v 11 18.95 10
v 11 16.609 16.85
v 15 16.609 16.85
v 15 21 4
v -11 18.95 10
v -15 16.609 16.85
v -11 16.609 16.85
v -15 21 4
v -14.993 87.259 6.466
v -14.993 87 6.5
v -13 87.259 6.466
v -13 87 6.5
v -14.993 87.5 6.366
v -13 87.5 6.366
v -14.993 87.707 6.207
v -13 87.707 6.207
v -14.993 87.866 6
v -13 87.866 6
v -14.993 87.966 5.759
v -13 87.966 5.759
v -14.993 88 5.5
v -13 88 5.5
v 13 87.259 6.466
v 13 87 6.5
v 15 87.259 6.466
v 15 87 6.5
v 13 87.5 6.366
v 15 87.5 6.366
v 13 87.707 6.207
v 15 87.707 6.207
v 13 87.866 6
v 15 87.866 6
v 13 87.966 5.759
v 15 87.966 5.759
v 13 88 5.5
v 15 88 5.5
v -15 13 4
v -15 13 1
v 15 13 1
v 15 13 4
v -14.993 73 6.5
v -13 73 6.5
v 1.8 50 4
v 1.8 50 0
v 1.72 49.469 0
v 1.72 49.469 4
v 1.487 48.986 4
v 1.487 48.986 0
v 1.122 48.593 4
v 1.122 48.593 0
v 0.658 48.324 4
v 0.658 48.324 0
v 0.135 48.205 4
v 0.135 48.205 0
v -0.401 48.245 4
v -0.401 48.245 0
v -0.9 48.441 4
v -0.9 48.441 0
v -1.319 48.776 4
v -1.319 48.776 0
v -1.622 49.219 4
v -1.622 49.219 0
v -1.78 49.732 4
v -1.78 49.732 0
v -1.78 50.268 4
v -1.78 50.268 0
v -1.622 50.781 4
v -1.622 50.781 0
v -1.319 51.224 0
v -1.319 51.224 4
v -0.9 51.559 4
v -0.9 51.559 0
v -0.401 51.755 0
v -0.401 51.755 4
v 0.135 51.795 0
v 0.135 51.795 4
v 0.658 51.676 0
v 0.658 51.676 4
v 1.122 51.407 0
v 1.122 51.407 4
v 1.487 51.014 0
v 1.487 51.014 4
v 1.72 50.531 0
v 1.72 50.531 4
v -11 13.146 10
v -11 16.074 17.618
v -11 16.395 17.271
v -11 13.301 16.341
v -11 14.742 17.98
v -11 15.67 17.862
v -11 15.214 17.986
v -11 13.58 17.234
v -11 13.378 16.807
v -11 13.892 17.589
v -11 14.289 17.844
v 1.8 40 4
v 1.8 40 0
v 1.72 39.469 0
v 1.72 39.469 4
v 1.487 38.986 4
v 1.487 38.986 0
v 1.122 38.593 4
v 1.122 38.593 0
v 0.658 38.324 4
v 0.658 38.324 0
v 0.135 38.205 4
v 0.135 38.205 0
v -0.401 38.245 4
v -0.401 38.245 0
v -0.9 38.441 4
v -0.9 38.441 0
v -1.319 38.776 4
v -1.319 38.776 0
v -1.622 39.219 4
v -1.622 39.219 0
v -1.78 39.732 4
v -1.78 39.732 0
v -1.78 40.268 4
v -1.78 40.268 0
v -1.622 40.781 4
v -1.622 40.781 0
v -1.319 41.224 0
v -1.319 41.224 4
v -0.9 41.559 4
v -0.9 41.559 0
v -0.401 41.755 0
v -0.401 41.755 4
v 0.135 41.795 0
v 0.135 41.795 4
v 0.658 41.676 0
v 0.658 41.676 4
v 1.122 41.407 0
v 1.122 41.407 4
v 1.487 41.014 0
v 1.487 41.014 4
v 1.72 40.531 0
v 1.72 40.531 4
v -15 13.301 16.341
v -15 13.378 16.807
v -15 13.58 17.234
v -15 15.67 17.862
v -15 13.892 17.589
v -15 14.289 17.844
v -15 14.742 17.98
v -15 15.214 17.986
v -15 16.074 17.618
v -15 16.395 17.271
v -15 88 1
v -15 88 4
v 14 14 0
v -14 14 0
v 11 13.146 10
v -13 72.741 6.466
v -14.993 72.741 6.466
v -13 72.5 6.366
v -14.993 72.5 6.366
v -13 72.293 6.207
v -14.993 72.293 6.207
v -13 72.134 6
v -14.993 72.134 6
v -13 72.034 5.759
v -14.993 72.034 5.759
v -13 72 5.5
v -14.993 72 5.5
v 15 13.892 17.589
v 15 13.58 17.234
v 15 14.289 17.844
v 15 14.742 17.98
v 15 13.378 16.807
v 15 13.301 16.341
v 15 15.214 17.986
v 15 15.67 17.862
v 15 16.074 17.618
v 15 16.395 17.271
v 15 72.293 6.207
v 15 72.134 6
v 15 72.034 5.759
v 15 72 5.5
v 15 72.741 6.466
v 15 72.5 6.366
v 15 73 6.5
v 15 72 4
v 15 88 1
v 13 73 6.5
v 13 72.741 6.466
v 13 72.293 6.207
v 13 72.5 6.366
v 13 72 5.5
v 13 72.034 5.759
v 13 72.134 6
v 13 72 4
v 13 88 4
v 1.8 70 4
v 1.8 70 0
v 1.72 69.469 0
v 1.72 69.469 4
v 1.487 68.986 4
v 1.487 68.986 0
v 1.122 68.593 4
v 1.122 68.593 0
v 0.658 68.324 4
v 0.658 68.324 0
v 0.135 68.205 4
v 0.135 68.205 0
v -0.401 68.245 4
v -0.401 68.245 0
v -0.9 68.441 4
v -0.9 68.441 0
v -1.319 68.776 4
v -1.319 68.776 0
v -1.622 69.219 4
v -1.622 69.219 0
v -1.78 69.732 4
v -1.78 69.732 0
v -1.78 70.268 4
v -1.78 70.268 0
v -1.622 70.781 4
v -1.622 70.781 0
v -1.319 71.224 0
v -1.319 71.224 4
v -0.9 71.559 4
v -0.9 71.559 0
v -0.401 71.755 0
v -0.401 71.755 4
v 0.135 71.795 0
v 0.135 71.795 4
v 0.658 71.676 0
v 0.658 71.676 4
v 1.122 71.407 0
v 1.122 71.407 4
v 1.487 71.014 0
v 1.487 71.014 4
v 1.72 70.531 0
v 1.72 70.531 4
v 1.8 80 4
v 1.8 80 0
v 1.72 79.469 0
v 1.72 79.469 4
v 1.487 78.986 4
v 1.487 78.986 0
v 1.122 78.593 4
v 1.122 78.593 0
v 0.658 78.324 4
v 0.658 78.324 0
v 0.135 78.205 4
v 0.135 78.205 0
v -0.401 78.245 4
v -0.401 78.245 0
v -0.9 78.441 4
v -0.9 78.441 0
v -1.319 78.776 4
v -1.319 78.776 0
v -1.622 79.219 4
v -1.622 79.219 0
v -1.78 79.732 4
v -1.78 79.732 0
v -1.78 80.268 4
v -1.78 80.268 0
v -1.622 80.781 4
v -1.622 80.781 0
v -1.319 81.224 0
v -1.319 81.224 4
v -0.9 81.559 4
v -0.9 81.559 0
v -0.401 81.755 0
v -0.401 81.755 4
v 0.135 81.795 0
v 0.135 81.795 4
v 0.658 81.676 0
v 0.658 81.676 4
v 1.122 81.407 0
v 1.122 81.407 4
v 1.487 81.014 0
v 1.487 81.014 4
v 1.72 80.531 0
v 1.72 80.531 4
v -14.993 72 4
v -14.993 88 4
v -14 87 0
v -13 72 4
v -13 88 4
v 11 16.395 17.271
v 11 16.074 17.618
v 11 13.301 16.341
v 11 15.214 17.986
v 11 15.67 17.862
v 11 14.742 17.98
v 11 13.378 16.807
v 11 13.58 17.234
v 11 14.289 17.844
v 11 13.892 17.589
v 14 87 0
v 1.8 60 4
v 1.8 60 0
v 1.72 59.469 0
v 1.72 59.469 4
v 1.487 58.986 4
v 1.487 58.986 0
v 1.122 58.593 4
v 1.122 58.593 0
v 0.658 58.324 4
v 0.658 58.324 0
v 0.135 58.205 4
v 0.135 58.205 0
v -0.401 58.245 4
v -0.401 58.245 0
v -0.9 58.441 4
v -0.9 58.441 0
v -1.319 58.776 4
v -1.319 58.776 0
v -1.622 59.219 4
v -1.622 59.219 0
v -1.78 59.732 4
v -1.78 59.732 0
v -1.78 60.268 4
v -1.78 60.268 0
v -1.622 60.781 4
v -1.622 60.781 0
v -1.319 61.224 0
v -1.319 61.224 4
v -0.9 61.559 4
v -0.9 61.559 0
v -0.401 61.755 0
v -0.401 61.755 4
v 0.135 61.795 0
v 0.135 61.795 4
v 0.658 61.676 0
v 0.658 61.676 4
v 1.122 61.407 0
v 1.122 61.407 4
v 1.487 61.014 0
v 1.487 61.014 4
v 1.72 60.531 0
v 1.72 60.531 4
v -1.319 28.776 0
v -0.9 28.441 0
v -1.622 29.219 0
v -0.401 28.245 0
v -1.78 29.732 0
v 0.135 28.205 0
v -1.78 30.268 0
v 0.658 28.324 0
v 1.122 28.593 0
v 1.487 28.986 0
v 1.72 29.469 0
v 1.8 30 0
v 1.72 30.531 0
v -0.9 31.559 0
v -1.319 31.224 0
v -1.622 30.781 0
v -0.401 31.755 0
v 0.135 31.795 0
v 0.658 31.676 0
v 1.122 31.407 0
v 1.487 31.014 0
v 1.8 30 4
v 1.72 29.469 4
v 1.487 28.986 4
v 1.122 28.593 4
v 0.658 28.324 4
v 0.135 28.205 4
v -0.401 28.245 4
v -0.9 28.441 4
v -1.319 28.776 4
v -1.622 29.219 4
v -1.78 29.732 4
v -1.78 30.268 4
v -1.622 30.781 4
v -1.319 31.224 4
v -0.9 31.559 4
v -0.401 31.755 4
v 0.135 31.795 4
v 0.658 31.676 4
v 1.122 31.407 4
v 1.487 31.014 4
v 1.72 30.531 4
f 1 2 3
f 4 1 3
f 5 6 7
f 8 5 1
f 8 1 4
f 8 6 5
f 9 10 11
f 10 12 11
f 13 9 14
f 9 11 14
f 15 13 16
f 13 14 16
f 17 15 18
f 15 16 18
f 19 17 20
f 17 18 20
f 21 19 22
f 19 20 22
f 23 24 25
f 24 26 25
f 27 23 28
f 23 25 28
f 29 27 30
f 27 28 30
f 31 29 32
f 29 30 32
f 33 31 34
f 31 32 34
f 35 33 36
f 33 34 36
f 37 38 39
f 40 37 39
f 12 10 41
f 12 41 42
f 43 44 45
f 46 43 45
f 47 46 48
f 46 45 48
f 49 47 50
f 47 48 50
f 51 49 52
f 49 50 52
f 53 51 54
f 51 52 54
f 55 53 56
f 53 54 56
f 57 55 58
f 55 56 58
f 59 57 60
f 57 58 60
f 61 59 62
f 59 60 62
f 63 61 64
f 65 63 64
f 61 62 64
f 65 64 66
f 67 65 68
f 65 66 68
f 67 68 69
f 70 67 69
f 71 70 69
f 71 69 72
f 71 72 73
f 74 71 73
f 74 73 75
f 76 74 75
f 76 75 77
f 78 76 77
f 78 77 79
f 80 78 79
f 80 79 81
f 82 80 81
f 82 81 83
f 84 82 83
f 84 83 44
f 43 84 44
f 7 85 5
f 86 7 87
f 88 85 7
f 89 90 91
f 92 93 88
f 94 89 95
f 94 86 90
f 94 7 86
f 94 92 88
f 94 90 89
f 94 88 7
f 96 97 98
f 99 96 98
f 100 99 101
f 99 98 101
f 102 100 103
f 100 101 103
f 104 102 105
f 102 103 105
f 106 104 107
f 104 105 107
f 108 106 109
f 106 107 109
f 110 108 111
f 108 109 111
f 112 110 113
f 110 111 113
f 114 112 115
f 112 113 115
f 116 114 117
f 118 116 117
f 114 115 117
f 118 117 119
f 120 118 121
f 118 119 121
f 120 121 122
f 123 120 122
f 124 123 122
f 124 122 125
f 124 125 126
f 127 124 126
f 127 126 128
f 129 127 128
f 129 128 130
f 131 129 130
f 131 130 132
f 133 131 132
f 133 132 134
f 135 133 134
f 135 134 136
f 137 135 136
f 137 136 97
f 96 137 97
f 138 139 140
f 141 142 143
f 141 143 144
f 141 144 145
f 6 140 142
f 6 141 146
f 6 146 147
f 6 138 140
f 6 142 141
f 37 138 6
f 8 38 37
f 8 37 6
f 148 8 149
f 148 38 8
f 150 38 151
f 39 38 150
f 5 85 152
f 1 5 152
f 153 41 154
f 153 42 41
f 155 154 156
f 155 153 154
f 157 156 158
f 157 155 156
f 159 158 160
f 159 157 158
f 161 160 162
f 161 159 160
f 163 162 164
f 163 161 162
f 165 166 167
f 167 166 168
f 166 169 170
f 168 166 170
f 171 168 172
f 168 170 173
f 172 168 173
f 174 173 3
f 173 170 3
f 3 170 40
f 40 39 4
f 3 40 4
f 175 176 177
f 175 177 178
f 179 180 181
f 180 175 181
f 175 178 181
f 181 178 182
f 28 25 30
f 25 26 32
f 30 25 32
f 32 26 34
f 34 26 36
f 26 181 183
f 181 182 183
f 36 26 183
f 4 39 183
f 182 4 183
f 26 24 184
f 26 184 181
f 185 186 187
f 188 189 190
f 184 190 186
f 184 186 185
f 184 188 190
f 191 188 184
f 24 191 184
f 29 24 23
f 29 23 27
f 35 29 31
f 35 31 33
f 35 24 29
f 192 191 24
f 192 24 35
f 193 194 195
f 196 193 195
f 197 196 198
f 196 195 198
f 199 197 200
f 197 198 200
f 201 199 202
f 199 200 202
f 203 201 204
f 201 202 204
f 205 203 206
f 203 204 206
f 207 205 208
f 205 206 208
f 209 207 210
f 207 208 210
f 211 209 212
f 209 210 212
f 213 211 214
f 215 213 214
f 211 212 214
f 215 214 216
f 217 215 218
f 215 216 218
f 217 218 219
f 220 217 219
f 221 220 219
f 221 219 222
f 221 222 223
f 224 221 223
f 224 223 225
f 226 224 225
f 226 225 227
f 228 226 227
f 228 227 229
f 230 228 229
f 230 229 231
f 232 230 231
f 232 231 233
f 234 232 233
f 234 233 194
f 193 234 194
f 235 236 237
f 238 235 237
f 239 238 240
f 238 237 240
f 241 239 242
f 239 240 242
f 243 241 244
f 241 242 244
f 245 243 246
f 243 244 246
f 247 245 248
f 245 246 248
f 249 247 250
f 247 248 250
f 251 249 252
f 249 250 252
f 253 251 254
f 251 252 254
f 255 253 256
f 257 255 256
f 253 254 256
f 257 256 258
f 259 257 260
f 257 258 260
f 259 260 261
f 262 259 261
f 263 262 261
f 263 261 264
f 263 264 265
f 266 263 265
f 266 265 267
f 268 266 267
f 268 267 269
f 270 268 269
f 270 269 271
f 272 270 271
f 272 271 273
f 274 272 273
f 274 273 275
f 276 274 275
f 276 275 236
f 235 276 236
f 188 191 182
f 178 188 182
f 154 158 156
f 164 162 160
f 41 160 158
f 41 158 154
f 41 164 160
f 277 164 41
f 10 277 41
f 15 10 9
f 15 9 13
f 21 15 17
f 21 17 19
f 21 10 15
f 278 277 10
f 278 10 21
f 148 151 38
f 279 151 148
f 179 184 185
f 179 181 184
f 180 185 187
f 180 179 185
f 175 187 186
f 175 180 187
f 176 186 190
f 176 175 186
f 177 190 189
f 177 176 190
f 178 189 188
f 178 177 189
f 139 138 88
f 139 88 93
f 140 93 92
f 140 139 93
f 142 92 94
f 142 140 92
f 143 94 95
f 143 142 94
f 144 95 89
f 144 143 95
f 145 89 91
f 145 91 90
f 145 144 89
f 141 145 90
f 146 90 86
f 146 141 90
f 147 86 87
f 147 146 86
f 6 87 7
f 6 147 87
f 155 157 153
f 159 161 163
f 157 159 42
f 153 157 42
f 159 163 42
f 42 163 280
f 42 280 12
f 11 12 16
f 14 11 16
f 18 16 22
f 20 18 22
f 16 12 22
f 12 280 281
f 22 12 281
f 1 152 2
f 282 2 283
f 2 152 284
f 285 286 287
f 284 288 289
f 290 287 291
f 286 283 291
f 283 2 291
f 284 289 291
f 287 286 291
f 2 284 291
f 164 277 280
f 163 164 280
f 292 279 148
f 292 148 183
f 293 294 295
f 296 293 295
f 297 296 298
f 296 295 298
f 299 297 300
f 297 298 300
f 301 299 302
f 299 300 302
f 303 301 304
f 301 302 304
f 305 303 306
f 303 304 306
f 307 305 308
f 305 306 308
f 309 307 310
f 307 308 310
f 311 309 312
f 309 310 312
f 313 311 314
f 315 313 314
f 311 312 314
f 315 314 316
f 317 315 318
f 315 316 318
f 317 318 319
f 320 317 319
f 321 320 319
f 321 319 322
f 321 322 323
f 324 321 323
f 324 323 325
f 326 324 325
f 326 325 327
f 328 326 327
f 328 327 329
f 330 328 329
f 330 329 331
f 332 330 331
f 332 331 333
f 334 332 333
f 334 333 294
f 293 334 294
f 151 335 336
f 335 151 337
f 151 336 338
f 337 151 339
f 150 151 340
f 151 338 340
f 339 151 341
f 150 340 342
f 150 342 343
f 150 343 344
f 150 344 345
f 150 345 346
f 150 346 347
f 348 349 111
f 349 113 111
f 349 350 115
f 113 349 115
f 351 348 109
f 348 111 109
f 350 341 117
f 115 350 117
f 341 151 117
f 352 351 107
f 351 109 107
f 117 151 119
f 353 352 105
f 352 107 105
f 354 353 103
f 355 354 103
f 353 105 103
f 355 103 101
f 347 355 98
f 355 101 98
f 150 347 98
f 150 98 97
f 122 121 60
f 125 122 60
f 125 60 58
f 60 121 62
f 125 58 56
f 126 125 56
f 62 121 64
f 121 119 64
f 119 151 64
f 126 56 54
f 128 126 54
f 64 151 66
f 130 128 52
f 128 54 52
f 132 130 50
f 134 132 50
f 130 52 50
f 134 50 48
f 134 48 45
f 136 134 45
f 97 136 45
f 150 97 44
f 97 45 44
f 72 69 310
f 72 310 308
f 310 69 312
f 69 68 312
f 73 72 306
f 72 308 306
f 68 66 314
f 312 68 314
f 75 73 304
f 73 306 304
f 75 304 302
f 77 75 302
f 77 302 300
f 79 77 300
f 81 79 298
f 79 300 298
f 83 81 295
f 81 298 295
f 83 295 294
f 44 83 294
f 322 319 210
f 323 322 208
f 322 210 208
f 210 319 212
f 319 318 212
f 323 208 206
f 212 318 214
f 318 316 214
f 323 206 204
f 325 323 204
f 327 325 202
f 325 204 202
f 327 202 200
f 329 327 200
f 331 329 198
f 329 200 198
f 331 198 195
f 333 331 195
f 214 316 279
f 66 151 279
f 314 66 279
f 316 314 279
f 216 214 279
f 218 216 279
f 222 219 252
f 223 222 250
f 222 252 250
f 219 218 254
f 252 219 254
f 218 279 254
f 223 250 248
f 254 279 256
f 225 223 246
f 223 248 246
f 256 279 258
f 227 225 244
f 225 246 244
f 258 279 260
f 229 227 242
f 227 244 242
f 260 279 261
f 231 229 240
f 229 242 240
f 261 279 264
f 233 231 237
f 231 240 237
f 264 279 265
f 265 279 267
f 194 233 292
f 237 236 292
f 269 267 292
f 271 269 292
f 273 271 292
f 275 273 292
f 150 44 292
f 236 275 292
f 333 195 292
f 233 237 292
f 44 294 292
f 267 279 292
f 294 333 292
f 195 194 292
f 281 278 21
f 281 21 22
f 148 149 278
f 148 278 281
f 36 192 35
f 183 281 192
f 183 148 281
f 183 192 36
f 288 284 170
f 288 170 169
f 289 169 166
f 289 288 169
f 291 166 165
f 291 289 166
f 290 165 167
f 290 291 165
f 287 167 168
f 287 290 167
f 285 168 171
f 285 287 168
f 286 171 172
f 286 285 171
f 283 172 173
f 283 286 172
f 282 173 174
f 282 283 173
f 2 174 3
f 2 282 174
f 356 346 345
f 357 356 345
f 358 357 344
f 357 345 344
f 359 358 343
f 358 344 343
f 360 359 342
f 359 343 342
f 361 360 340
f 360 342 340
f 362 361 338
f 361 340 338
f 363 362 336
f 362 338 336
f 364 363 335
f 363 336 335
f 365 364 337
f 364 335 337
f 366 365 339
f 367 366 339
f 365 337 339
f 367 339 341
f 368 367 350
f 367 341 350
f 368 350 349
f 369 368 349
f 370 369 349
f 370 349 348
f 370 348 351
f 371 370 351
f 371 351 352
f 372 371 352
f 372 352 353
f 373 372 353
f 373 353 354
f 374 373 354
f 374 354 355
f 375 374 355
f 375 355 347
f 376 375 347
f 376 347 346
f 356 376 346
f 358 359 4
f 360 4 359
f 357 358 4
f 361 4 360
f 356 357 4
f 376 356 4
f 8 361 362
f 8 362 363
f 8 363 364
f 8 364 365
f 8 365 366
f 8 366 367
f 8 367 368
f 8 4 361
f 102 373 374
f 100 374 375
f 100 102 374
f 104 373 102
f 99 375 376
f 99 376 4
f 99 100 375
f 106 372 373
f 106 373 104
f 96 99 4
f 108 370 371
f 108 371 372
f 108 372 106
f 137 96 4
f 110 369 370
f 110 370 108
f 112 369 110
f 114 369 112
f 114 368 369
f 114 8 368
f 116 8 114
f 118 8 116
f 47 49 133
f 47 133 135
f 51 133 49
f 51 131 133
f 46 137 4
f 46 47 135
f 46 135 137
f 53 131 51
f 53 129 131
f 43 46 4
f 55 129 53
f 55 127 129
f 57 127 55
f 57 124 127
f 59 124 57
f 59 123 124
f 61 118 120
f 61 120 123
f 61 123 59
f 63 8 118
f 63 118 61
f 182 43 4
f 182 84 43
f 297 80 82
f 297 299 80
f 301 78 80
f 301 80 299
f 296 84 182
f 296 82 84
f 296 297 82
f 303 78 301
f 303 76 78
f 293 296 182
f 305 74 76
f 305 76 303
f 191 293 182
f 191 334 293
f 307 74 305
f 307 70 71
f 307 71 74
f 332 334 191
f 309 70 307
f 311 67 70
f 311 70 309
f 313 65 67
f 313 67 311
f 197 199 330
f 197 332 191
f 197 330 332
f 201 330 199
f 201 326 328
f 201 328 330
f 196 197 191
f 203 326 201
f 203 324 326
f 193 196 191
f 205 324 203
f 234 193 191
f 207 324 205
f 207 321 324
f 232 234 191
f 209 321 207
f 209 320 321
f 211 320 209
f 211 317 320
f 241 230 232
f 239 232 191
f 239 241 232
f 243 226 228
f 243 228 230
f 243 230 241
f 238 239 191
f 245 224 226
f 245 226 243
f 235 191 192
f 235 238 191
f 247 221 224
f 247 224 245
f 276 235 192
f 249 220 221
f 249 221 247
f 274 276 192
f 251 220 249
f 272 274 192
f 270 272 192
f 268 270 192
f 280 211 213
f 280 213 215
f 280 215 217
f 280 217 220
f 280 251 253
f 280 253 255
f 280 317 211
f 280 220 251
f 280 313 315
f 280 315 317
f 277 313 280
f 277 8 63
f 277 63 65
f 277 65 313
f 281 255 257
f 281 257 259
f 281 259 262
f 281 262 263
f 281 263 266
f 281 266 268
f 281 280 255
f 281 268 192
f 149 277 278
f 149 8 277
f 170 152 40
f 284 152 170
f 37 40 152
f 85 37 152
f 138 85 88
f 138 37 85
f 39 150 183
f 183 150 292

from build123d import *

# Parameters (mm, degrees)
SKETCH_W        = 30
SKETCH_H        = 75
PAD_DEPTH       = 20
POCKET_DEPTH    = 30.001
POCKET001_DEPTH = 30.001
SKETCH003_R     = 1.8
POCKET002_DEPTH = 18.001
SKETCH004_W     = 22
SKETCH004_H     = 10
POCKET003_DEPTH = 75.001
SKETCH005_W     = 1.992782
SKETCH005_H     = 16
SKETCH005_W_2   = 2
PAD001_DEPTH    = 2.5
FILLET_R        = 1
CHAMFER_SIZE    = 1


with BuildPart() as part:
    # Sketch → Pad (new body)
    with BuildSketch(Plane.XY):
        with Locations((0, 50.5)):
            Rectangle(SKETCH_W, SKETCH_H)
    extrude(amount=PAD_DEPTH)

    # Sketch001 → Pocket (cut, through all)
    with BuildSketch(Plane(origin=(-15, 0, 0), x_dir=(0, -1, 0), z_dir=(-1, 0, 0))):
        Polygon((-90.237335, 21), (-17.197588, 21), (-21.197588, 4), (-90.237335, 4), align=None)
    extrude(amount=-POCKET_DEPTH, mode=Mode.SUBTRACT)

    # Sketch002 → Pocket001 (cut, through all)
    with BuildSketch(Plane(origin=(-15, 0, 0), x_dir=(0, -1, 0), z_dir=(-1, 0, 0))):
        with BuildLine():
            ThreePointArc((-13.300504, 16.341381), (-14.741789, 17.980276), (-16.608656, 16.849752))
            Line((-16.608656, 16.849752), (-21.00001, 4))
            Line((-25, 4), (-21.00001, 4))
            Line((-25, 18.137928), (-25, 4))
            Line((-25, 18.137928), (-12.210917, 22))
            Line((-12.210917, 22), (-13, 4))
            Line((-13, 4), (-13.300504, 16.341381))
        make_face()
    extrude(amount=-POCKET001_DEPTH, mode=Mode.SUBTRACT)

    # Sketch003 → Pocket002 (cut, through all)
    with BuildSketch(Plane(origin=(0, 0, 0), x_dir=(1, 0, 0), z_dir=(0, 0, -1))):
        with Locations((0, -80)):
            Circle(SKETCH003_R)
        with Locations((0, -70)):
            Circle(SKETCH003_R)
        with Locations((0, -60)):
            Circle(SKETCH003_R)
        with Locations((0, -50)):
            Circle(SKETCH003_R)
        with Locations((0, -40)):
            Circle(SKETCH003_R)
        with Locations((0, -30)):
            Circle(SKETCH003_R)
    extrude(amount=-POCKET002_DEPTH, mode=Mode.SUBTRACT)

    # Sketch004 → Pocket003 (cut, through all)
    with BuildSketch(Plane.XZ.offset(-13)):
        with Locations((0, 15)):
            Rectangle(SKETCH004_W, SKETCH004_H)
    extrude(amount=-POCKET003_DEPTH, mode=Mode.SUBTRACT)

    # Sketch005 → Pad001 (new body)
    with BuildSketch(Plane.XY.offset(4)):
        with Locations((-13.996391, 80)):
            Rectangle(SKETCH005_W, SKETCH005_H)
        with Locations((14, 80)):
            Rectangle(SKETCH005_W_2, SKETCH005_H)
    extrude(amount=PAD001_DEPTH)

    # Fillet
    fillet_edges = [part.edges().sort_by_distance(p)[0] for p in [
        (-13.996391, 72, 6.5),
        (14, 72, 6.5),
        (14, 88, 6.5),
        (-13.996391, 88, 6.5),
    ]]
    fillet(fillet_edges, radius=FILLET_R)

    # Chamfer
    chamfer_edges = [part.edges().sort_by_distance(p)[0] for p in [
        (0, 13, 0),
        (15, 50.5, 0),
        (-15, 50.5, 0),
        (0, 88, 0),
    ]]
    chamfer(chamfer_edges, length=CHAMFER_SIZE)


solid = part.part
